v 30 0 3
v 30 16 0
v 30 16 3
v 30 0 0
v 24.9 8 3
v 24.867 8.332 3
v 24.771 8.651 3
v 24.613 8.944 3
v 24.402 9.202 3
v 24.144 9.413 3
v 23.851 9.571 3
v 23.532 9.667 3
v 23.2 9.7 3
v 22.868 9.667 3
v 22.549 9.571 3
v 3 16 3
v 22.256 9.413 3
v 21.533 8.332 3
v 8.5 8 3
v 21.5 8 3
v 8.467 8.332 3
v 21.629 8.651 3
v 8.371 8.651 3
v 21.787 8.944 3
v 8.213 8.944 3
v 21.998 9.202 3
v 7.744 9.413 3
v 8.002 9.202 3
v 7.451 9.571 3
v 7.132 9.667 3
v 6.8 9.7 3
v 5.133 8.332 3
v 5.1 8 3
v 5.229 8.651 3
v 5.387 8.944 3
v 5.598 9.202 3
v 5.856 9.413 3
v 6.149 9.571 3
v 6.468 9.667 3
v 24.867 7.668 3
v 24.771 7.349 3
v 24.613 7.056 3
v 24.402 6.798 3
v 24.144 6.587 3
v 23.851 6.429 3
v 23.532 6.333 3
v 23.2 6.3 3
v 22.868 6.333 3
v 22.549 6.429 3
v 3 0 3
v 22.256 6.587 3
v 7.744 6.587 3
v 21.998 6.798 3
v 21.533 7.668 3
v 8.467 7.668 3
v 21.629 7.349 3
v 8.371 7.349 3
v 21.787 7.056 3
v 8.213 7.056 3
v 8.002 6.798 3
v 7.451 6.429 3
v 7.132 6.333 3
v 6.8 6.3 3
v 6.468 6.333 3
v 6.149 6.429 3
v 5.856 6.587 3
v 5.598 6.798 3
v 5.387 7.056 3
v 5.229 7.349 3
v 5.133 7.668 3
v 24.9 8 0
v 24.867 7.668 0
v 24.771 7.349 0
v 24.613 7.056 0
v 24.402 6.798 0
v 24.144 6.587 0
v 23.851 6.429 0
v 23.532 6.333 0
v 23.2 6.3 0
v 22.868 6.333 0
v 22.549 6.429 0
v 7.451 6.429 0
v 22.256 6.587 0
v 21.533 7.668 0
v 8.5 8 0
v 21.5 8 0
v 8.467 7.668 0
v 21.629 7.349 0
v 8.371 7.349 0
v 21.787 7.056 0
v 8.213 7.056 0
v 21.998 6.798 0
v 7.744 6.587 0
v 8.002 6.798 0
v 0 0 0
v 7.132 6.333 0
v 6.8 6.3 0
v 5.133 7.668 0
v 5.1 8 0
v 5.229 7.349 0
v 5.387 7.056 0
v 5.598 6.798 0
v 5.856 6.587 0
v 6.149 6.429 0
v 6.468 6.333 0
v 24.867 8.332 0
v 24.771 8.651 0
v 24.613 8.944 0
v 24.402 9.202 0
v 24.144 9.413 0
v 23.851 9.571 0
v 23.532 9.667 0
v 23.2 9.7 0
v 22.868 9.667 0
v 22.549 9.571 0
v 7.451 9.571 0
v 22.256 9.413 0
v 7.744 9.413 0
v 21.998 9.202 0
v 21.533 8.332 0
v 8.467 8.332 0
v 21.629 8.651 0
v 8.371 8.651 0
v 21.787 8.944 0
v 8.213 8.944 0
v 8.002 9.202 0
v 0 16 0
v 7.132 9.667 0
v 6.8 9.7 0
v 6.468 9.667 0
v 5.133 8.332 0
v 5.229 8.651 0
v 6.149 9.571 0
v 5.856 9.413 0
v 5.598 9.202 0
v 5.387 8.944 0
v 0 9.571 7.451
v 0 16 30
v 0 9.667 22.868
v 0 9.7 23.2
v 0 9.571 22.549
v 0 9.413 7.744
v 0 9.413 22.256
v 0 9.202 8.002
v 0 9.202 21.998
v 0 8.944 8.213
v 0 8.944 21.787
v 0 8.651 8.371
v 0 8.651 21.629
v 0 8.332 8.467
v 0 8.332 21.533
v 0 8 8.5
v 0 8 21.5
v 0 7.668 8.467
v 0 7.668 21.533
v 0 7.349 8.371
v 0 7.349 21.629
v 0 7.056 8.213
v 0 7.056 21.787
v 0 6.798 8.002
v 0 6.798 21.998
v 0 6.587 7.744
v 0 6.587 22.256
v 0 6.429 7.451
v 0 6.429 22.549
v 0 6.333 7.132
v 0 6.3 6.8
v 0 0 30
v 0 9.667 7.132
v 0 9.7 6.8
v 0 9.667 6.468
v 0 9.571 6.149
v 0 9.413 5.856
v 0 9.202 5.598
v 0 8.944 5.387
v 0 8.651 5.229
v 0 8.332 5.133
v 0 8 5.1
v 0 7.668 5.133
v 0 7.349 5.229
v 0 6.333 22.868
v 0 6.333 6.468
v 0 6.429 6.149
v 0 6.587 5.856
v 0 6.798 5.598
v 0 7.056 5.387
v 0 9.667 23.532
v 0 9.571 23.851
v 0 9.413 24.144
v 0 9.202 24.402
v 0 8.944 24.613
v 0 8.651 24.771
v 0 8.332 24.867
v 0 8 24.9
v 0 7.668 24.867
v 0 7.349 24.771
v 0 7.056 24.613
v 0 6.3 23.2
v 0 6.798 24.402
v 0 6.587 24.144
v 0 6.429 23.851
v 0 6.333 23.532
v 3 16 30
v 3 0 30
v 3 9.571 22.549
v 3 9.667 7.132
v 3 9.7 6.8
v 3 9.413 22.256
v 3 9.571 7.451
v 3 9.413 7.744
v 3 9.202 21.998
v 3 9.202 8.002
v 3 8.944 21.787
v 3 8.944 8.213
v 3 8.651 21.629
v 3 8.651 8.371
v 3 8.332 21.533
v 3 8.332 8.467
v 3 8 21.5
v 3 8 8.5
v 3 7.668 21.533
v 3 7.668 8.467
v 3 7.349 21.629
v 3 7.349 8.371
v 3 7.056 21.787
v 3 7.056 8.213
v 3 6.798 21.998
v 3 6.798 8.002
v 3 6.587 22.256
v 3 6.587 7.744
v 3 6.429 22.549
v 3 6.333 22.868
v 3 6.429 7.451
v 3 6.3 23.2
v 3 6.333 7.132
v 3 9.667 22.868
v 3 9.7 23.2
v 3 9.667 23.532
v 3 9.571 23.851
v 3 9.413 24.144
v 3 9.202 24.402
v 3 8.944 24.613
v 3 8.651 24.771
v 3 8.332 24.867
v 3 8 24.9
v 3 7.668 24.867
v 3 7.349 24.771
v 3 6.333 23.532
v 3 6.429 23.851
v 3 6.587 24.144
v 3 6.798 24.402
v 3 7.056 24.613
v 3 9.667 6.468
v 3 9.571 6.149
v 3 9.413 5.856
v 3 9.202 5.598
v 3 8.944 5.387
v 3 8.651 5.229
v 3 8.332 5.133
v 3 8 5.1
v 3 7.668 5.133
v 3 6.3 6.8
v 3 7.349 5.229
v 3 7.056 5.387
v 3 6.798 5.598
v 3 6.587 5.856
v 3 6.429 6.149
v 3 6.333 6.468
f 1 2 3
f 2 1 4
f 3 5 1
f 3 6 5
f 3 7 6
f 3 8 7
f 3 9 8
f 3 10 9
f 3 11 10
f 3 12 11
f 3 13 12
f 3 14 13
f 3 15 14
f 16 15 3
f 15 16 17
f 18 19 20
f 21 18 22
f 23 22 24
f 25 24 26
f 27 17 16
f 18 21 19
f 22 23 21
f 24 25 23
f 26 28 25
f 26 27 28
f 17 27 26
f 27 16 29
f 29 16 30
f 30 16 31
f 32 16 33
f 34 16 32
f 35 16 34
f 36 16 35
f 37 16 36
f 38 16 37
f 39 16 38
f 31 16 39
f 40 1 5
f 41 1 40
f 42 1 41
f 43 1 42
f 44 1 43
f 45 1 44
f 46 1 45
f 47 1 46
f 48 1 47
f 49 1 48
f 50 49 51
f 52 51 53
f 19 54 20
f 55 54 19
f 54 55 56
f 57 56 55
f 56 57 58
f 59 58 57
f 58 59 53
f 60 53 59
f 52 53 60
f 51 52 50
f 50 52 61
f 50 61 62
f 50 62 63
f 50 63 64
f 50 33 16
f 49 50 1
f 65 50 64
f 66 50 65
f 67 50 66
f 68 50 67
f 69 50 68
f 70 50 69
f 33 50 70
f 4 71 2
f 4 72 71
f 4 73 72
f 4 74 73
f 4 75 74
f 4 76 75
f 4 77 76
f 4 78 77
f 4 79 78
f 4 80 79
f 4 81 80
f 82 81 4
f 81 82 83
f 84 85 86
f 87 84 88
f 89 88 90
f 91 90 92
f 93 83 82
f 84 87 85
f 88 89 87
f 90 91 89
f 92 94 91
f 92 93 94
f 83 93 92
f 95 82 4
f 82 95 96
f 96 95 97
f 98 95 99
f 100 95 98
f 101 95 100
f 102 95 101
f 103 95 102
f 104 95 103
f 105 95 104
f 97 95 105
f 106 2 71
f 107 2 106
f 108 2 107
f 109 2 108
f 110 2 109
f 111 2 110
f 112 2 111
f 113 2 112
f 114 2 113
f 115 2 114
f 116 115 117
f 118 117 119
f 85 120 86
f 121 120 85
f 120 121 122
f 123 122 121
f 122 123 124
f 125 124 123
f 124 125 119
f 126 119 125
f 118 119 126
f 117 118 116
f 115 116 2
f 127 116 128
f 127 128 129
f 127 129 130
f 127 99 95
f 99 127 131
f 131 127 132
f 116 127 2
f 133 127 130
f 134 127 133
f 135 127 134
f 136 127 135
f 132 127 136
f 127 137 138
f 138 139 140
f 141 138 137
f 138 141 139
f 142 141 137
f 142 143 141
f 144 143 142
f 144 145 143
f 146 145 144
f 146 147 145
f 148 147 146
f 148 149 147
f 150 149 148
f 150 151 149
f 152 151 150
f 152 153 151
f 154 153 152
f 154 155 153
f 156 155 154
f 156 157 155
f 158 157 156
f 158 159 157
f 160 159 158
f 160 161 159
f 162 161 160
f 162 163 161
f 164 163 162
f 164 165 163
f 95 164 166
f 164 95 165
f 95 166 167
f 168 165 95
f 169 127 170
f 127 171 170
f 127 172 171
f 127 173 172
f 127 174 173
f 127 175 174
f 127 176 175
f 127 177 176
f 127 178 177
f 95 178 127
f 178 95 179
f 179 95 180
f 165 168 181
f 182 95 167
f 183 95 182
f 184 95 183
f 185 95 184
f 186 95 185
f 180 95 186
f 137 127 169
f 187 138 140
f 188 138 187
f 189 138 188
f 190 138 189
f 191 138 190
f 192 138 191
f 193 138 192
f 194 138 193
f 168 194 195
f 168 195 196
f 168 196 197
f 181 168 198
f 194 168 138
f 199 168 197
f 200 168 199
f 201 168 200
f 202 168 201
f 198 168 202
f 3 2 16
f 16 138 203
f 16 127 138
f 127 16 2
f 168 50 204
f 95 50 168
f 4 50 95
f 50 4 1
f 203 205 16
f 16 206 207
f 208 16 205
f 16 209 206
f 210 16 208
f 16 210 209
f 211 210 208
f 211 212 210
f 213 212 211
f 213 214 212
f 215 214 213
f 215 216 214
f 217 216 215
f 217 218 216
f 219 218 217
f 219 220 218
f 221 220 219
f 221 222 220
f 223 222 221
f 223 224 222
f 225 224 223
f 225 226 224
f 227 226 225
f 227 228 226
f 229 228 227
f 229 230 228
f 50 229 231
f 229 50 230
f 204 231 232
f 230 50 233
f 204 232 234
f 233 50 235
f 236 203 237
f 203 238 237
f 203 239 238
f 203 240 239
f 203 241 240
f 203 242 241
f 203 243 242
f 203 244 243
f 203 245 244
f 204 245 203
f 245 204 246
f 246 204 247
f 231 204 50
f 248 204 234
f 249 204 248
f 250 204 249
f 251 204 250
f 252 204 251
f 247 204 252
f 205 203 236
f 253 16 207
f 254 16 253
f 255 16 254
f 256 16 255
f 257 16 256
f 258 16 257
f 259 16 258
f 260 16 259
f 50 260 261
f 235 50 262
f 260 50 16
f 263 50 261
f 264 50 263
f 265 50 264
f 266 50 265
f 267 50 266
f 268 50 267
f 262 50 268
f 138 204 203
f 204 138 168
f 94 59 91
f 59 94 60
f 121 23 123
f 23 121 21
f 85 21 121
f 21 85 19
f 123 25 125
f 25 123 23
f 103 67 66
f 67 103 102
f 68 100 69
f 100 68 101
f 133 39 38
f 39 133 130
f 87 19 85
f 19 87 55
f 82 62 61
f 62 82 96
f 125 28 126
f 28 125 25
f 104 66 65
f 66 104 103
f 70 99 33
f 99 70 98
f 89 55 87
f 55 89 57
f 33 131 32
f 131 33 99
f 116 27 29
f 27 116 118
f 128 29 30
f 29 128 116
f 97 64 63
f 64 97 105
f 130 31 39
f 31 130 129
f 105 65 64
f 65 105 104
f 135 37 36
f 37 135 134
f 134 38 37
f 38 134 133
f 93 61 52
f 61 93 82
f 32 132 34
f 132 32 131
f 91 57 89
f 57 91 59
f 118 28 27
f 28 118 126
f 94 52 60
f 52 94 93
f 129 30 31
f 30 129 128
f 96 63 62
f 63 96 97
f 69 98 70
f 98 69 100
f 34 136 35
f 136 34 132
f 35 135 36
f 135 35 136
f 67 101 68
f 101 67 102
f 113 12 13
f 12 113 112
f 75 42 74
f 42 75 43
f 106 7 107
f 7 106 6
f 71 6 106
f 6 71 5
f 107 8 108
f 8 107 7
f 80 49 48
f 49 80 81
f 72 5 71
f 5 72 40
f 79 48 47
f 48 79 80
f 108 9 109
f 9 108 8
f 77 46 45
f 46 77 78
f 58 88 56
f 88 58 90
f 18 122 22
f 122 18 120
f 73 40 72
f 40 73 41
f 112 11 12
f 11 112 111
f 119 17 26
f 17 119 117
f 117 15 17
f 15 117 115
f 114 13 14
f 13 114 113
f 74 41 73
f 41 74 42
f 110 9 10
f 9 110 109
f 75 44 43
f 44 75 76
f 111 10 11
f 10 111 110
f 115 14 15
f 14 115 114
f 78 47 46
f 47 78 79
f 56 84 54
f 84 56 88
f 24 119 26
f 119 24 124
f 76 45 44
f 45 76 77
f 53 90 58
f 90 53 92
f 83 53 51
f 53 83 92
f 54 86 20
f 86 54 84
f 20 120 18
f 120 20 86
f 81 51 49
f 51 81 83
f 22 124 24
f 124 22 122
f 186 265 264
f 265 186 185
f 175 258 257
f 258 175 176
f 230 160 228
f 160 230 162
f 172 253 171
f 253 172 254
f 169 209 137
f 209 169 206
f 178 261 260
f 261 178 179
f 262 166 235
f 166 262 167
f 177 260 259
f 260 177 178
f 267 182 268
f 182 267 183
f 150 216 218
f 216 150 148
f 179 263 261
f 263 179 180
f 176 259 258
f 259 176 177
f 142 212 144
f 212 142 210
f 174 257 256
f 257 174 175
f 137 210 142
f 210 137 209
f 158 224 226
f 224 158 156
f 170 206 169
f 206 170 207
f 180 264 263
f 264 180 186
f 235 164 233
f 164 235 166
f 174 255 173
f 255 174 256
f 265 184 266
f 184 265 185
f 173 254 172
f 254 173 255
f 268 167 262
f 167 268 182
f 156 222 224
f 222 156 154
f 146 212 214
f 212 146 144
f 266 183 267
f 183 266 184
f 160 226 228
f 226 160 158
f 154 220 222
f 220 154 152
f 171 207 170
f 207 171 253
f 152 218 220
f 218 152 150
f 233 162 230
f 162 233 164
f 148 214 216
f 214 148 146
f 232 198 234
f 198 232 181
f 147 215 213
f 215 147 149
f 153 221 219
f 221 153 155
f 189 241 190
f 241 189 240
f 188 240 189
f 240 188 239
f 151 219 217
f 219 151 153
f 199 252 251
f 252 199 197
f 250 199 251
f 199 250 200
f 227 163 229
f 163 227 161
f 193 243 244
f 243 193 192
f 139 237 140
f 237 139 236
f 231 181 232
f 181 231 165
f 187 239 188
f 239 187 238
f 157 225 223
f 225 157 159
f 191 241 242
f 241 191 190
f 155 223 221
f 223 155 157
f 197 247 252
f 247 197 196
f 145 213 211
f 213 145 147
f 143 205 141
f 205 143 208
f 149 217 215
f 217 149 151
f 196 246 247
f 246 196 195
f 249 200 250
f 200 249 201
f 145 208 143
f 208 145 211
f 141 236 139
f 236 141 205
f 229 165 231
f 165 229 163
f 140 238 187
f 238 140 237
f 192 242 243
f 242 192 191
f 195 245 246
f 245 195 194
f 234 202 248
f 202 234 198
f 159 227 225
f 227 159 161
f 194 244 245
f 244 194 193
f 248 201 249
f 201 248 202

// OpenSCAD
$fn = 32;

// ----------------------------------------------------------------------
// L-bracket: 30 x 16 x 30 mm
// ----------------------------------------------------------------------

// --- parameters (mm) ---
horiz_len = 30;           // horizontal leg, X
vert_len = 30;            // vertical leg, Z
profile_w = 16;           // bracket depth, Y
plate_t = 3;              // plate thickness
hole_d = 3.4;             // clearance for M3

module hole_z(px, py) {
  translate([px, py, -0.5]) cylinder(h = plate_t + 1, d = hole_d);
}
module hole_x(pz, py) {
  translate([-0.5, py, pz]) rotate([0, 90, 0]) cylinder(h = plate_t + 1, d = hole_d);
}

difference() {
  union() {
    /* horizontal leg */
    cube([horiz_len, profile_w, plate_t]);
    /* vertical leg, overlapping the corner block */
    cube([plate_t, profile_w, vert_len]);
  }
  hole_z(6.8, 8);
  hole_z(23.2, 8);
  hole_x(6.8, 8);
  hole_x(23.2, 8);
}
